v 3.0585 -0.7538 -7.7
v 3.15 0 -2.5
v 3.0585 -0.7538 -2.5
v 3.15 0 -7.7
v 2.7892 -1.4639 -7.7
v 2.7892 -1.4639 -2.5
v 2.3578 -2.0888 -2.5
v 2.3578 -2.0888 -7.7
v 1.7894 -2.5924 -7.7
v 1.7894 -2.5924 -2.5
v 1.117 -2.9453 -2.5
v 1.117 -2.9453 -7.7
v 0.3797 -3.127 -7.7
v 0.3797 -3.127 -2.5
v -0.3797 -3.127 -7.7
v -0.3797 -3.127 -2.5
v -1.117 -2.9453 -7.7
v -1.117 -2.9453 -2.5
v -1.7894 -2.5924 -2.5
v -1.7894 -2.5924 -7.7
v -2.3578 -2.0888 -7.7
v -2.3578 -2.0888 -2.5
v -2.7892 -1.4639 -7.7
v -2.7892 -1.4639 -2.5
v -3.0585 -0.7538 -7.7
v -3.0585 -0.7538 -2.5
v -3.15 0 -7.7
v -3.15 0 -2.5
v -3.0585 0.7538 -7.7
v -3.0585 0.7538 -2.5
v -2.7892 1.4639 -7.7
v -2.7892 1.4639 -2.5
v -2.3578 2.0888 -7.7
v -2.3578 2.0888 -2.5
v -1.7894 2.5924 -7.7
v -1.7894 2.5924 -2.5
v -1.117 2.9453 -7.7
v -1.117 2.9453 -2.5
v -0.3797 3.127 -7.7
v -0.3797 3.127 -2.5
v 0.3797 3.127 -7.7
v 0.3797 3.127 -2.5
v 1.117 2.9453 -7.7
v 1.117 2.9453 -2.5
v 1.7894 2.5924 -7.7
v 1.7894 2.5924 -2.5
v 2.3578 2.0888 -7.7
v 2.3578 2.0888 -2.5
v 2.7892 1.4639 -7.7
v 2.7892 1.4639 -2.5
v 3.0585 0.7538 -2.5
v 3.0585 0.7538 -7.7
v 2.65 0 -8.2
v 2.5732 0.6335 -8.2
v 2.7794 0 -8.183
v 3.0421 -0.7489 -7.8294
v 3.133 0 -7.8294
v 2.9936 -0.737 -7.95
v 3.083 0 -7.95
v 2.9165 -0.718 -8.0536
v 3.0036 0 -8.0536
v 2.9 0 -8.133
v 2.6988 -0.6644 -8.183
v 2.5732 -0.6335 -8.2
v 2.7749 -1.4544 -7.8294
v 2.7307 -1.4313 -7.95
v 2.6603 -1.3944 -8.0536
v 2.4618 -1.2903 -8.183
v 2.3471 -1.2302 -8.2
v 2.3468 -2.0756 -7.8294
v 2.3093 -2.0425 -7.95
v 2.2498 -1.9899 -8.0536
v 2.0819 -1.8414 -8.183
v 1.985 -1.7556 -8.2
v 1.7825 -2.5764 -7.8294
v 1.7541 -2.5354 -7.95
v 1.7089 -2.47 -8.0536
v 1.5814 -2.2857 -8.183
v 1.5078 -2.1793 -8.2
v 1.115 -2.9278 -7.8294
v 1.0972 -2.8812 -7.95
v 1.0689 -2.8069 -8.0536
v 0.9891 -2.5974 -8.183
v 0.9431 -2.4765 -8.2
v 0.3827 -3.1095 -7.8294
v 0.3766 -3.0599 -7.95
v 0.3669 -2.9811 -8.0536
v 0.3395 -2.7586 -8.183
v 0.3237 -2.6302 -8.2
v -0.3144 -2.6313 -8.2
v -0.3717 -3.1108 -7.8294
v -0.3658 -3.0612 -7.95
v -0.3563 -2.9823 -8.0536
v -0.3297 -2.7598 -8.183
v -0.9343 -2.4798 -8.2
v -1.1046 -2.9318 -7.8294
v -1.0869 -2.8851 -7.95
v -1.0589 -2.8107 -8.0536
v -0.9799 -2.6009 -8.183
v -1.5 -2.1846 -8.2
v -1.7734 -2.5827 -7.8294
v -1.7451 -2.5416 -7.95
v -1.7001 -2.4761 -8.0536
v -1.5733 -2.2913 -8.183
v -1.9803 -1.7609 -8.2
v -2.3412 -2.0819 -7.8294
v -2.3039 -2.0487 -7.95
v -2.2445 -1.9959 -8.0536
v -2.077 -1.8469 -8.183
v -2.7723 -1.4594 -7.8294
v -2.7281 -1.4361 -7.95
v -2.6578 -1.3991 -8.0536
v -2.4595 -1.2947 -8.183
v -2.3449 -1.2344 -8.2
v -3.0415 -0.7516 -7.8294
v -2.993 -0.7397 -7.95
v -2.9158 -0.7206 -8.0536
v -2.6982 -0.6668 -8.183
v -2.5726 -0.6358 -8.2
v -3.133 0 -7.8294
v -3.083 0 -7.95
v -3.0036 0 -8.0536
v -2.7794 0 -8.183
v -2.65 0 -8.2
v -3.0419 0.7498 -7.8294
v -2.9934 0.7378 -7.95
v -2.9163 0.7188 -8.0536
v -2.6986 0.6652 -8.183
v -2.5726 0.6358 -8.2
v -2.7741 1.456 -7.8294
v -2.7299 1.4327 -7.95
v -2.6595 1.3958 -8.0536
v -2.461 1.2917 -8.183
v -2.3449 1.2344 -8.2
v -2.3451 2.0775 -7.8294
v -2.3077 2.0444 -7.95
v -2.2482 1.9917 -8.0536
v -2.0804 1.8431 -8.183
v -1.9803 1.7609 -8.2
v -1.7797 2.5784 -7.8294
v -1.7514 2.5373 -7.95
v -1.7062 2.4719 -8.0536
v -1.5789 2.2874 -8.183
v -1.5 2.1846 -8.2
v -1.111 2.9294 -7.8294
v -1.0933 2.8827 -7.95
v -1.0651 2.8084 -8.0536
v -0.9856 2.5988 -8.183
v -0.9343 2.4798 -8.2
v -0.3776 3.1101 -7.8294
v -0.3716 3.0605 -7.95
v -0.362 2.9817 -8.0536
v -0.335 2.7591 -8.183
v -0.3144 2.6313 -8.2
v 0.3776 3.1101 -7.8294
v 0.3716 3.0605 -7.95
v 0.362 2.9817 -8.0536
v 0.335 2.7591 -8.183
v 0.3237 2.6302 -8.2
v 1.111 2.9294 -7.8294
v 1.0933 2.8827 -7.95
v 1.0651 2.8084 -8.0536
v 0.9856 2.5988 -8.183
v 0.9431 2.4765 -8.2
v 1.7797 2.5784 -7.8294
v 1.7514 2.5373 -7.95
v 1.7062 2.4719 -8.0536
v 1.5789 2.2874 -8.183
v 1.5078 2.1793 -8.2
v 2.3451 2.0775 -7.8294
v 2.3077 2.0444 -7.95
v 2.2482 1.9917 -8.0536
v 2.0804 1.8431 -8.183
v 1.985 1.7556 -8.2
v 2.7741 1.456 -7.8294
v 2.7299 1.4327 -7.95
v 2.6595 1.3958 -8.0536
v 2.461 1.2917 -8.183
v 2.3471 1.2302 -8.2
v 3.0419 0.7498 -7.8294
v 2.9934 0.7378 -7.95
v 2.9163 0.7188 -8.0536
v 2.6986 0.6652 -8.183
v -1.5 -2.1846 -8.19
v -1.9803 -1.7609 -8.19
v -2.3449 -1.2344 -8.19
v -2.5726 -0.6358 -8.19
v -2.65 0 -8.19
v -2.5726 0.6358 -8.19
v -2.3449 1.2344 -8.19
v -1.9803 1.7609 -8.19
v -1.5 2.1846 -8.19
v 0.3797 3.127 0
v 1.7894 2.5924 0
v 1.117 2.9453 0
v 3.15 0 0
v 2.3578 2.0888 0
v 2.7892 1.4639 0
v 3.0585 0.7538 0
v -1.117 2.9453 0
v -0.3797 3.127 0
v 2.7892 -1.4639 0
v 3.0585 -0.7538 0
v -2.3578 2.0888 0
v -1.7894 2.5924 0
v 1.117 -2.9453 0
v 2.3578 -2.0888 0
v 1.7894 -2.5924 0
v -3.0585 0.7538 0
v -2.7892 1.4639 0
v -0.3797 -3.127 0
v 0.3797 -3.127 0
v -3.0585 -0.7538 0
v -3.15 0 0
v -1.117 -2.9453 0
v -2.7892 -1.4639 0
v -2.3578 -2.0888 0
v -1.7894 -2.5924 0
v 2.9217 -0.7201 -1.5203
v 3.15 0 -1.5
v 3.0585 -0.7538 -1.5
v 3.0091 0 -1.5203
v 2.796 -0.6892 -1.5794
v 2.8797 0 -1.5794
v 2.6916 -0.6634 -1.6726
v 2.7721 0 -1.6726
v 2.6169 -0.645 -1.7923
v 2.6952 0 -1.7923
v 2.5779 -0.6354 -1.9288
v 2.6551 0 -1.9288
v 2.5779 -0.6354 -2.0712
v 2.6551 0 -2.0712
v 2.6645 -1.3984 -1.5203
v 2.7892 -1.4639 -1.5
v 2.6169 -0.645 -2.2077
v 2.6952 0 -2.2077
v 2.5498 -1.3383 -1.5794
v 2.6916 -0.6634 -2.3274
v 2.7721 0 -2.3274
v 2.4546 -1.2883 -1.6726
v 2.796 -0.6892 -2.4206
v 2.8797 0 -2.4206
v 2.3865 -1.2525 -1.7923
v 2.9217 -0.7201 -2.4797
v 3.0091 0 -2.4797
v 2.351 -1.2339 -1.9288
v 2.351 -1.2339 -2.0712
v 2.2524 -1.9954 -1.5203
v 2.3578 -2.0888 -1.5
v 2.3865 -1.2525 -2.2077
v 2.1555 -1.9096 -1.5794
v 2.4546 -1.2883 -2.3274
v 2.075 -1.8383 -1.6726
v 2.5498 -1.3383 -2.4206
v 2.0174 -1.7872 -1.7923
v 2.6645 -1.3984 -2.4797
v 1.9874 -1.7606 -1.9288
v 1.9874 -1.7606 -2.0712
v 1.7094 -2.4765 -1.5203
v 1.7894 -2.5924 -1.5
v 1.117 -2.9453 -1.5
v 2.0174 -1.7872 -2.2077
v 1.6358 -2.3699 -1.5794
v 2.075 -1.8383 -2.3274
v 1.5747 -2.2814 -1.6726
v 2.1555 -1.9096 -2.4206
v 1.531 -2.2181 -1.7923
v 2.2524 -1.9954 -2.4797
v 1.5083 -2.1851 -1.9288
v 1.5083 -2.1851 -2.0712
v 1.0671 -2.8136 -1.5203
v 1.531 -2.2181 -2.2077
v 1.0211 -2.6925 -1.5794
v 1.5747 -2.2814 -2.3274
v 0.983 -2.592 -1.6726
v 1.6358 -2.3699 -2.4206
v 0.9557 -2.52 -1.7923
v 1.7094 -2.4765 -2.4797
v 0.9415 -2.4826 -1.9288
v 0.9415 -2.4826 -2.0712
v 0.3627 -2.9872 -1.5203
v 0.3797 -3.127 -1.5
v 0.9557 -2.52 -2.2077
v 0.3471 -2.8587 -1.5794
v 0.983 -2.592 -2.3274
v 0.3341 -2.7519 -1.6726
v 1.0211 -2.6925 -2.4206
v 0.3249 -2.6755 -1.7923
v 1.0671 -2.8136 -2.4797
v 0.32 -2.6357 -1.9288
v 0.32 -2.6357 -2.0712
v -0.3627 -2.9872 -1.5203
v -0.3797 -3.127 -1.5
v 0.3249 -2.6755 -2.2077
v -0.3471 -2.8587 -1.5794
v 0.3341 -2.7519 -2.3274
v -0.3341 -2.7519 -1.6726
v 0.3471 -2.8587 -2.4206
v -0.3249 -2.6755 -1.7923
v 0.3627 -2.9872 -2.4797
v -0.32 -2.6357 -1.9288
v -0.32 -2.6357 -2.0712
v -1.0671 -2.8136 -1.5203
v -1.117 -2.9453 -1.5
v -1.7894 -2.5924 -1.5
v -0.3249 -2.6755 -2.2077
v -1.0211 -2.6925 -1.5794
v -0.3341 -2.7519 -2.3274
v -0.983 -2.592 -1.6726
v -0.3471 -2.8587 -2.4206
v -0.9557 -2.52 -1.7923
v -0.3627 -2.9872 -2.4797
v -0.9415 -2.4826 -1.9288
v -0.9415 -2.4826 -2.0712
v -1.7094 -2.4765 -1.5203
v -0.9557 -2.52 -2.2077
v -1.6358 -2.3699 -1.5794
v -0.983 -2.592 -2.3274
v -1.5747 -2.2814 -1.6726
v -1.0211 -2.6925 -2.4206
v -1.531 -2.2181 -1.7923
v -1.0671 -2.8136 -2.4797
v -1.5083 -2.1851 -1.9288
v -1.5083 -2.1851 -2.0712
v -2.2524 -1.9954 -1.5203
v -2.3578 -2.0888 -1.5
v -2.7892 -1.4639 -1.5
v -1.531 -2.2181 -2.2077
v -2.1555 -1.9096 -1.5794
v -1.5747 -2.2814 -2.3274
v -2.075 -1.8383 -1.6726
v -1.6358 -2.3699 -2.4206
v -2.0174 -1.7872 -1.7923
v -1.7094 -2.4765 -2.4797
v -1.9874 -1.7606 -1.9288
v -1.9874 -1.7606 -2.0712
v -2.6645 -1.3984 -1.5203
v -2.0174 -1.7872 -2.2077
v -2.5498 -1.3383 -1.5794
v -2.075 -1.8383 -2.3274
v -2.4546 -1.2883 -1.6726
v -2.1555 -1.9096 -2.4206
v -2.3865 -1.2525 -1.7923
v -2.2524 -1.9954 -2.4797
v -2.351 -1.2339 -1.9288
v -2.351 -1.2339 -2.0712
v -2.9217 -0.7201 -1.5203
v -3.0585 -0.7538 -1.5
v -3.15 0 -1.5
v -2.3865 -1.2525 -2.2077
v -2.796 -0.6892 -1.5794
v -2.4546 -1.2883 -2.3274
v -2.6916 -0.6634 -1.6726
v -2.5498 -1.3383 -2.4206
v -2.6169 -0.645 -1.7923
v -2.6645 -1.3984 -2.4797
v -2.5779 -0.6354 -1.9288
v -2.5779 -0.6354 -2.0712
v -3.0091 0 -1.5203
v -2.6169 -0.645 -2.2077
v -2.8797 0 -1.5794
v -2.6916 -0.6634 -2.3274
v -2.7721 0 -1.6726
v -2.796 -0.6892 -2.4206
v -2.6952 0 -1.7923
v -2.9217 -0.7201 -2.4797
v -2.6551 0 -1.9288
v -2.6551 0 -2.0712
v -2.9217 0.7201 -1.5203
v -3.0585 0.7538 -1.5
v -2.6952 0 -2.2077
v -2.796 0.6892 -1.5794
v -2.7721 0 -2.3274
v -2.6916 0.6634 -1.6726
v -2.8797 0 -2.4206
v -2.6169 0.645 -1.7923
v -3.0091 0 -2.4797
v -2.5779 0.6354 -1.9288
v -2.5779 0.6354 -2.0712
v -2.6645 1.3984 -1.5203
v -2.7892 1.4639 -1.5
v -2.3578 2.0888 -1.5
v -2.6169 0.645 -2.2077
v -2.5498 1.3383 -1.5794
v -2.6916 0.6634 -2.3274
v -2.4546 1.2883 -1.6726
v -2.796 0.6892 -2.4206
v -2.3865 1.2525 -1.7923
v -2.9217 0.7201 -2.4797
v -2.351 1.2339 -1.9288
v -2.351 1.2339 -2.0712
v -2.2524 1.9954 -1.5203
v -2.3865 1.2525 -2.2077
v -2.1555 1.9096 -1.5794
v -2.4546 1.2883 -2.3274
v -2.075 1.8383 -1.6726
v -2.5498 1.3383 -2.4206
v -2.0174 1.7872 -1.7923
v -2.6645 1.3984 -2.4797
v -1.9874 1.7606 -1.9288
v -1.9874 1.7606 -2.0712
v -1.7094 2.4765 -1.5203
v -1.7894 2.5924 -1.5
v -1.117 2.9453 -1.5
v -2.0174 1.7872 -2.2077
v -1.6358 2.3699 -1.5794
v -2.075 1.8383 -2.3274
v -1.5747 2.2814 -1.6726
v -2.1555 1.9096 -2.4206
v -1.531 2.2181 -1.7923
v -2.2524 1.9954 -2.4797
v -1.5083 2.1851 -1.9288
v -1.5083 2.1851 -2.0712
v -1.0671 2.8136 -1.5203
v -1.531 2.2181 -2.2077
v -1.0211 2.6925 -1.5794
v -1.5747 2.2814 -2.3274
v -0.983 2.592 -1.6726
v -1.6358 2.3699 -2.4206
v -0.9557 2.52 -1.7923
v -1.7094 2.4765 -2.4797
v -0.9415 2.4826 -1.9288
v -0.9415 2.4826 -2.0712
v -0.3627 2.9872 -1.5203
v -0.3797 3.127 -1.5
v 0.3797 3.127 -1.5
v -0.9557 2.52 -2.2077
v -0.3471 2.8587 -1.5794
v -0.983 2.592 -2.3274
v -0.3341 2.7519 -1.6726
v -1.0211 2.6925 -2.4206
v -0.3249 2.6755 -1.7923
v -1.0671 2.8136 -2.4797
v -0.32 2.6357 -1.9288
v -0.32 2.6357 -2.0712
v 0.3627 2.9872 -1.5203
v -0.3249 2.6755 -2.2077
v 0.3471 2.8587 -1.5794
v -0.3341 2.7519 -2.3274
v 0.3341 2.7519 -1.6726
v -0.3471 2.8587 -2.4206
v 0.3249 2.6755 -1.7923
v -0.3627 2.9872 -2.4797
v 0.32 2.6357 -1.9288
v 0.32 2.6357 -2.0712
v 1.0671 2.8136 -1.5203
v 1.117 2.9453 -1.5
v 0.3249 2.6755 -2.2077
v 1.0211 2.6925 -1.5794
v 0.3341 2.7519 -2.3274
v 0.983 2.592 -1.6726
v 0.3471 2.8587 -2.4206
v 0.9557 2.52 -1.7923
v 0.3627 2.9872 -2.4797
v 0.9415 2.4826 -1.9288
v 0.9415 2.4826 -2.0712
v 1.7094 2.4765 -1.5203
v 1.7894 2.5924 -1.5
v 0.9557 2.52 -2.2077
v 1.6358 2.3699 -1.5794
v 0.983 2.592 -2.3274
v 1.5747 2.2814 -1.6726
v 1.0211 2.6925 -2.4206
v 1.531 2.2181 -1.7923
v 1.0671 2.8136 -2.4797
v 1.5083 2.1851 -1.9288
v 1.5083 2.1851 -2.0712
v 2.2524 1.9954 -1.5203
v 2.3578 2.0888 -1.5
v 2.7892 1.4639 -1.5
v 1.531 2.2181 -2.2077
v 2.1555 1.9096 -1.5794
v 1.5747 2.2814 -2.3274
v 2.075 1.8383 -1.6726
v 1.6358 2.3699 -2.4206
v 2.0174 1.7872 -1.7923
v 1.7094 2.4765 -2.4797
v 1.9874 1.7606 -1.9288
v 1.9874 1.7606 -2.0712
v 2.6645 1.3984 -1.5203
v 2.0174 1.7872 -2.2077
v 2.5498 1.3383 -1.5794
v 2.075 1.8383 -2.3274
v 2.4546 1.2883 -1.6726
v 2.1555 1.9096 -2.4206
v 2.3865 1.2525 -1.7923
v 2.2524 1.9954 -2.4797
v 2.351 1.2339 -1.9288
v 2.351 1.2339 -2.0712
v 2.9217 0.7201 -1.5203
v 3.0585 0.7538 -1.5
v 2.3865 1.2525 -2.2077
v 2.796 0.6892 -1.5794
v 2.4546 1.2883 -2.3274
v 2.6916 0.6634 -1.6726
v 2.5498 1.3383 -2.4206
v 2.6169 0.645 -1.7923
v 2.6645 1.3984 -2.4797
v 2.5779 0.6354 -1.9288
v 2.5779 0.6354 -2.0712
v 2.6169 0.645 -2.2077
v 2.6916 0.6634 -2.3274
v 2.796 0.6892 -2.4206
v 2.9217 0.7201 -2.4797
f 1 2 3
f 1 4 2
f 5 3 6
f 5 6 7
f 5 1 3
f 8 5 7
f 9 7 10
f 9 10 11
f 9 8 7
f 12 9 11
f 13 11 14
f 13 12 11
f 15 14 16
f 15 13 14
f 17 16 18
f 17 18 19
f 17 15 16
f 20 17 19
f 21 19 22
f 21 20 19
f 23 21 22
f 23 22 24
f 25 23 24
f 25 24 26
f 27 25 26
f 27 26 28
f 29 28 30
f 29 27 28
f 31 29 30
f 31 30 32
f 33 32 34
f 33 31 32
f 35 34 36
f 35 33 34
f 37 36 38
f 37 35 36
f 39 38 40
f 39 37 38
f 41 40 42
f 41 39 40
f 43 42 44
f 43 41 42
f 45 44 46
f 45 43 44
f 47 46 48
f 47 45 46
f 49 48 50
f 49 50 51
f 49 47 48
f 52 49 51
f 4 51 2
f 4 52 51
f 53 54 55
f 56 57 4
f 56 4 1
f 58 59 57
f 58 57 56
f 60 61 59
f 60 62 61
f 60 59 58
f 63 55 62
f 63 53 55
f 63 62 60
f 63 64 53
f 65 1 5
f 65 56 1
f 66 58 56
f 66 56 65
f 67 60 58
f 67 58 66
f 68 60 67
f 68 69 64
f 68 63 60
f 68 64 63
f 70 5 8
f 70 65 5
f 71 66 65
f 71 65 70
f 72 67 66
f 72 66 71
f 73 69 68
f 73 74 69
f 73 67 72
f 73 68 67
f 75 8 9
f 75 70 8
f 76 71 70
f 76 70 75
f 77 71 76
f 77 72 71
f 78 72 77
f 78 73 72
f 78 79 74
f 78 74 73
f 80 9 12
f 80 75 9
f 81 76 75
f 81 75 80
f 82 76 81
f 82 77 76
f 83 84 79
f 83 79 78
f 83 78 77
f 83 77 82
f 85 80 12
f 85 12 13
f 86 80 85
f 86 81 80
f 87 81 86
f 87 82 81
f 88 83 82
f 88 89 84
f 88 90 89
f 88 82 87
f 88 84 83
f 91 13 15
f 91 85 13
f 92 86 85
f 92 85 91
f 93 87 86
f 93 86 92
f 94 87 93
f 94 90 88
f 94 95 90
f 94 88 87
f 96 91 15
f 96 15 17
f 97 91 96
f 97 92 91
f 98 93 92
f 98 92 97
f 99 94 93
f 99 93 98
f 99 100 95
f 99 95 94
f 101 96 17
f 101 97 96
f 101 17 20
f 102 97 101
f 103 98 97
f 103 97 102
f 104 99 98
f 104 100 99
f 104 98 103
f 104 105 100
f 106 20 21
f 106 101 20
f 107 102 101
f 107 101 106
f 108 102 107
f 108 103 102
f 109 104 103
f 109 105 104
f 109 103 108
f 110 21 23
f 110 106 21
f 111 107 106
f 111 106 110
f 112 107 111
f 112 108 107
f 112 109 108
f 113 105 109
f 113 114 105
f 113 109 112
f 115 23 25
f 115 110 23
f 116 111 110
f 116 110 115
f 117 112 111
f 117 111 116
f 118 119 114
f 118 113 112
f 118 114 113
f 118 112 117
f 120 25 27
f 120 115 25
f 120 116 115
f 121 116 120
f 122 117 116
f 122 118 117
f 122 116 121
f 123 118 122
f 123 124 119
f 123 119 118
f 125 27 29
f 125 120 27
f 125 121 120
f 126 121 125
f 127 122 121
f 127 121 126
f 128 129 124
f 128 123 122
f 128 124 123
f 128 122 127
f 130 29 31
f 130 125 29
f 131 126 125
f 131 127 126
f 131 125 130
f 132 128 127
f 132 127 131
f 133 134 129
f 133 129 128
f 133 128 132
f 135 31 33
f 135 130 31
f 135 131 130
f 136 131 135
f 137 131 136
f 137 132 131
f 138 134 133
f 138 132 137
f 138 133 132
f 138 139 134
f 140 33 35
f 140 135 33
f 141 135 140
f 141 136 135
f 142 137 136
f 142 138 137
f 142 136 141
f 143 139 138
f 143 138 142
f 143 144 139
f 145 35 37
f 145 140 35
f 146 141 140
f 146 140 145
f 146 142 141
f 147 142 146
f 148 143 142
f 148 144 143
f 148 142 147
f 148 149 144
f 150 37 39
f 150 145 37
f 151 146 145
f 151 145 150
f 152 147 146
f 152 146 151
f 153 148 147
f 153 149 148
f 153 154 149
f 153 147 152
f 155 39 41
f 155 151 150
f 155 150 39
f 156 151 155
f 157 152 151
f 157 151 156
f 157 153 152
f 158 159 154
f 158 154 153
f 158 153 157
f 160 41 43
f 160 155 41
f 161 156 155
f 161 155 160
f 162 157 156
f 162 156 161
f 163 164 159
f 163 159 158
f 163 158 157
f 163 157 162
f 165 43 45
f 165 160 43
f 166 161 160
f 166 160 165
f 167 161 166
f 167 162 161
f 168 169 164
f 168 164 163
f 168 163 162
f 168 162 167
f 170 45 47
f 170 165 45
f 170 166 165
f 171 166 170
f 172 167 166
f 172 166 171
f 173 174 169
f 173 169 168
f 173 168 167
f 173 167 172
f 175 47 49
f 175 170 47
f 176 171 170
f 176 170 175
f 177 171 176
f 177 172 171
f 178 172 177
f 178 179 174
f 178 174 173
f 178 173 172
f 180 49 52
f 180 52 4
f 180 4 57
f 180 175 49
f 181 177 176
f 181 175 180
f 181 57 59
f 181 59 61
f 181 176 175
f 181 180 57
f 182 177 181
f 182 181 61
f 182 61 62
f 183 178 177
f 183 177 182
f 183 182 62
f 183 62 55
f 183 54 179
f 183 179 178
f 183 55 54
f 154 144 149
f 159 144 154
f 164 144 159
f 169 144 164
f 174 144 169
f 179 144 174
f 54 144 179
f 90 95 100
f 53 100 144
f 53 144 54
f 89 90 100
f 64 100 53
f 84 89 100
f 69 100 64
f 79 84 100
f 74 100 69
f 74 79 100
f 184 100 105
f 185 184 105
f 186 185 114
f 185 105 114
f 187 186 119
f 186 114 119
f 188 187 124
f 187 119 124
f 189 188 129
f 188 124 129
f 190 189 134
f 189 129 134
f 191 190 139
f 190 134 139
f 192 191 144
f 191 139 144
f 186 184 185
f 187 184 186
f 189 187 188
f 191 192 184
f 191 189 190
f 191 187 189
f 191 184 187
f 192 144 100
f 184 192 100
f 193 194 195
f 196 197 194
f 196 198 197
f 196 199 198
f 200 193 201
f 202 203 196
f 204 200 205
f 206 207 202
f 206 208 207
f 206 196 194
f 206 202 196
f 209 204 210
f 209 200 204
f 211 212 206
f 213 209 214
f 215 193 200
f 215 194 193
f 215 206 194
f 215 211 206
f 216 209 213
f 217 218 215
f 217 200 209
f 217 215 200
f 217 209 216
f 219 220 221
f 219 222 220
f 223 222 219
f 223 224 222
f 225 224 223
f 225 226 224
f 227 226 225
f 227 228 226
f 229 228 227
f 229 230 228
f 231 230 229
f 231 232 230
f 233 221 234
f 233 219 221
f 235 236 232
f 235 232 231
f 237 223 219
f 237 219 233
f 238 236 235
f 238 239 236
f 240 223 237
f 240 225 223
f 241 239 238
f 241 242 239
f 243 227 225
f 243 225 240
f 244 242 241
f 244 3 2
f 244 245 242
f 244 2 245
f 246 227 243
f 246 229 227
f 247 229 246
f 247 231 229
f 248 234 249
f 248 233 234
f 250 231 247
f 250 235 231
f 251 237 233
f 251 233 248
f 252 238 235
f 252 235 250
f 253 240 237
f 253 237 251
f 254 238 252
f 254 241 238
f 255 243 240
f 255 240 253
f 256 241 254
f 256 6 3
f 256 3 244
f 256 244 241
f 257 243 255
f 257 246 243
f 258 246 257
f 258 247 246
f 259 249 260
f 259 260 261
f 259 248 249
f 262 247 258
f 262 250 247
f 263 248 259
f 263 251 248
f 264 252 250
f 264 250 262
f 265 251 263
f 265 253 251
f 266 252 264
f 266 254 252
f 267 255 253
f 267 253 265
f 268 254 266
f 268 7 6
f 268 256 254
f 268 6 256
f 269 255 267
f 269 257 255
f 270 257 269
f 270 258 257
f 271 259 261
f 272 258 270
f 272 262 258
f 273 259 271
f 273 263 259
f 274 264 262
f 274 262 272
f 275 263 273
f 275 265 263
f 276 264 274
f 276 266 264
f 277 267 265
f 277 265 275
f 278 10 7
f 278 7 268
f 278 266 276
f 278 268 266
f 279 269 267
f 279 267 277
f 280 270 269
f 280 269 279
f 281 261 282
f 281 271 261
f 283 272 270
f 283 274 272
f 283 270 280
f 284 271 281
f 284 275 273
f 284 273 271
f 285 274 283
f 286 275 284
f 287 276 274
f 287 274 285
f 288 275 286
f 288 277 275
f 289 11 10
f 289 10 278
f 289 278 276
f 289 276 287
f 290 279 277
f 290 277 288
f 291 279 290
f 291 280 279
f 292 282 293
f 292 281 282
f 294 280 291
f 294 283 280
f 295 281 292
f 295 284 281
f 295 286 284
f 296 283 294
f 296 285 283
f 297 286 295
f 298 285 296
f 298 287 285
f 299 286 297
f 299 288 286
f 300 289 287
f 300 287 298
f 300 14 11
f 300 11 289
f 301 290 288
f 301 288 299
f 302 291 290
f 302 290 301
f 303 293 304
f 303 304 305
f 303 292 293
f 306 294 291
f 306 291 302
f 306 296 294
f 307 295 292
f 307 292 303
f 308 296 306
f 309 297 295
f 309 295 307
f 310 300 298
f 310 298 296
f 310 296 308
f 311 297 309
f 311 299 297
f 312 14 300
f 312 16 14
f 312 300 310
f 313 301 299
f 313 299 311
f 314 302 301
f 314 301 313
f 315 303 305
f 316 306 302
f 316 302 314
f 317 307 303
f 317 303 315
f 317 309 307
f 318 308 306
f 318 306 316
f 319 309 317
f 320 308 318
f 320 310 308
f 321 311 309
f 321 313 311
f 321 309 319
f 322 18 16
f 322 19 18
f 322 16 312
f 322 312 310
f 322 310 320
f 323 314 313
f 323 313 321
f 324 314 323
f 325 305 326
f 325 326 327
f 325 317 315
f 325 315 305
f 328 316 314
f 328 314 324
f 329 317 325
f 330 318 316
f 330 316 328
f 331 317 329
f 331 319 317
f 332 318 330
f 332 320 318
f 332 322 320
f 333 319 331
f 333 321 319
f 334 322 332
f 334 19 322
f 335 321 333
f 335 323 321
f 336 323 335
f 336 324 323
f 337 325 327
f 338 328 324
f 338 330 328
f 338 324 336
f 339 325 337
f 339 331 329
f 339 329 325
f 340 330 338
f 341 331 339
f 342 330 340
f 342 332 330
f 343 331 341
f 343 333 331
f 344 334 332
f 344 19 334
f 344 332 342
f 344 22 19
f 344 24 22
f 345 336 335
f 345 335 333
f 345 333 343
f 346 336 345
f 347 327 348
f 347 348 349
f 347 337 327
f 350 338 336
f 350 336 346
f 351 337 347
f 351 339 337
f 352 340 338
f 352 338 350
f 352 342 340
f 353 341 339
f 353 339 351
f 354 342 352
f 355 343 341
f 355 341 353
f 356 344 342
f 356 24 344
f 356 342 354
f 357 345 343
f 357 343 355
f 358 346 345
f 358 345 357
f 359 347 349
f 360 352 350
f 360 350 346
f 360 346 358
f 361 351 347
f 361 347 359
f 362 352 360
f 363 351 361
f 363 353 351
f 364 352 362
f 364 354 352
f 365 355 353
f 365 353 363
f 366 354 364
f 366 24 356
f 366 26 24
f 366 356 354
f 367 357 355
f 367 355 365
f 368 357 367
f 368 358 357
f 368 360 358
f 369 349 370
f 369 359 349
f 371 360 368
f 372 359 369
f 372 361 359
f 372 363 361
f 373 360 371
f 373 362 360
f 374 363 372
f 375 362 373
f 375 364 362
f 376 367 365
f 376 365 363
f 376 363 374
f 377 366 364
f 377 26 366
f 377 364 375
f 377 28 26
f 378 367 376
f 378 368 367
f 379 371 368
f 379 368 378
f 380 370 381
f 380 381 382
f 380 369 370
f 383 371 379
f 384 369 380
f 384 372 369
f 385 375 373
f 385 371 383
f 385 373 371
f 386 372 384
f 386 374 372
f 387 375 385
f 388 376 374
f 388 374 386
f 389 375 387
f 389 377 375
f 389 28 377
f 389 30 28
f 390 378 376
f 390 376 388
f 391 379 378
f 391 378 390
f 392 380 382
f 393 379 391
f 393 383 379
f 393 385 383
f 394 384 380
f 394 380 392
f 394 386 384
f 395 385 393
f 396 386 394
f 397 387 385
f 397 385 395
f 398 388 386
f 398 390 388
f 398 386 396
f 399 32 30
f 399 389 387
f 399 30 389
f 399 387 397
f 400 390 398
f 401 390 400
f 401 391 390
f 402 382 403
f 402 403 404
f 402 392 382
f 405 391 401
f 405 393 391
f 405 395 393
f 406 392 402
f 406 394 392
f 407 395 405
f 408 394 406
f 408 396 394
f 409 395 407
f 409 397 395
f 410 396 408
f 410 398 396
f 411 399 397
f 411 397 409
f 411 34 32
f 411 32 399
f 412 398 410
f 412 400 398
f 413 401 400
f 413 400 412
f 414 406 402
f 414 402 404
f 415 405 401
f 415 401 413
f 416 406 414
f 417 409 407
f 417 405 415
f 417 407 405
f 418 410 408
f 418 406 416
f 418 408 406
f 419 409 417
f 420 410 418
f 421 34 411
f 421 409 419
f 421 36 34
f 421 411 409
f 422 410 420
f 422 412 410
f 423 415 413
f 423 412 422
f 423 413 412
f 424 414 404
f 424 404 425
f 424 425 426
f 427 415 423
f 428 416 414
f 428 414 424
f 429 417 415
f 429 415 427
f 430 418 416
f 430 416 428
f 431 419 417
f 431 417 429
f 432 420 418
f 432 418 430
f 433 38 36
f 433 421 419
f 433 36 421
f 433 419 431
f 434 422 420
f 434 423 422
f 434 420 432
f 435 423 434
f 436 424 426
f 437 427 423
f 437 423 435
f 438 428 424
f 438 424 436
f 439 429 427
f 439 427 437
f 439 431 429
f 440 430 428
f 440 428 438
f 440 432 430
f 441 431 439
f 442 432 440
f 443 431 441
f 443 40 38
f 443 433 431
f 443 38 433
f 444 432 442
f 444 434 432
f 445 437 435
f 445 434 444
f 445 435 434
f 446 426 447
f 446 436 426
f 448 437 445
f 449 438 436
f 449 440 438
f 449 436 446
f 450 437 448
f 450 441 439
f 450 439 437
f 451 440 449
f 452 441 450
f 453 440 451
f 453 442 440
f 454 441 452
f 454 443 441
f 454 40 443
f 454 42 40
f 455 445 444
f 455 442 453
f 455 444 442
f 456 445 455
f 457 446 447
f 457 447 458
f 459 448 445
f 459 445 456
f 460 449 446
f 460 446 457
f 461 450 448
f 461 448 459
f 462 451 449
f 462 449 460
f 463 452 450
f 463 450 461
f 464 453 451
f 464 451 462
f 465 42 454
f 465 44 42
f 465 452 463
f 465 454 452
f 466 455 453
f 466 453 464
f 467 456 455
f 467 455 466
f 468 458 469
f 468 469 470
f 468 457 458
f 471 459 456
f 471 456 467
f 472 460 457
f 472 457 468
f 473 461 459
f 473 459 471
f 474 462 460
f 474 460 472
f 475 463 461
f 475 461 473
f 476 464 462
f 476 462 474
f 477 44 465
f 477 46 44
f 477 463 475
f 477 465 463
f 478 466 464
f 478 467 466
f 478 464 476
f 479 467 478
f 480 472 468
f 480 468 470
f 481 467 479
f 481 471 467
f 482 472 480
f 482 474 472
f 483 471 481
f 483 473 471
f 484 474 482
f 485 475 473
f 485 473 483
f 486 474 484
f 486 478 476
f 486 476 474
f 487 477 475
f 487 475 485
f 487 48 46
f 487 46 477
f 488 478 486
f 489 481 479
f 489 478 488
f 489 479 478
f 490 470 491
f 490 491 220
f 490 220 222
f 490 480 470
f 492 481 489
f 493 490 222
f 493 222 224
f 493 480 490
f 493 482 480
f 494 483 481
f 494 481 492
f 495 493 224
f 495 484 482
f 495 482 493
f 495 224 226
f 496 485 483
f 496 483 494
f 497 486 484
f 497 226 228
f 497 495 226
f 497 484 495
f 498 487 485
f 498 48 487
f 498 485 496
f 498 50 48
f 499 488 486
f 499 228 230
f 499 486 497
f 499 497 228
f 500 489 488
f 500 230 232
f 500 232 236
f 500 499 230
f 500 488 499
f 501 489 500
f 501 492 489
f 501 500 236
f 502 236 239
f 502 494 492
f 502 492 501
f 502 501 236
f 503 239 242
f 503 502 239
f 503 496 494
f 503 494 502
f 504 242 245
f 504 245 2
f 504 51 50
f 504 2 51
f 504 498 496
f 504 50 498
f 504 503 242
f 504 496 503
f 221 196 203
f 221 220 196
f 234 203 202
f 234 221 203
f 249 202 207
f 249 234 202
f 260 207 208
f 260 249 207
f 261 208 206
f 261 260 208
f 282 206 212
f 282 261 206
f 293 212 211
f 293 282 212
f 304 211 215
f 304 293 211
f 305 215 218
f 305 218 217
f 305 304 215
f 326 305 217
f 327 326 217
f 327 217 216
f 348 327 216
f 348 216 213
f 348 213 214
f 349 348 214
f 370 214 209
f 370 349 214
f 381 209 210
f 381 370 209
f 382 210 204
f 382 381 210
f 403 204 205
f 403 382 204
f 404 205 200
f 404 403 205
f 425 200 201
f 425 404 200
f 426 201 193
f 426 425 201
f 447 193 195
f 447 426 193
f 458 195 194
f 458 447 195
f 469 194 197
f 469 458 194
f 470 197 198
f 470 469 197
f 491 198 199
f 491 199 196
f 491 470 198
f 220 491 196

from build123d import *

# Parameters (mm, degrees)
CUT_EXTRUDE1_DEPTH = 0.01


with BuildPart() as part:
    # Sketch1 → Revolve1 (revolve)
    with BuildSketch(Plane(origin=(0, 0, 0), x_dir=(1, 0, 0), z_dir=(0, 1, 0))):
        with BuildLine():
            Line((0, 0), (3.15, 0))
            Line((3.15, 0), (3.15, 1.5))
            ThreePointArc((3.15, 1.5), (2.65, 2), (3.15, 2.5))
            Line((3.15, 2.5), (3.15, 7.7))
            ThreePointArc((3.15, 7.7), (3.003553391, 8.053553391), (2.65, 8.2))
            Line((2.65, 8.2), (0, 8.2))
            Line((0, 8.2), (0, 0))
        make_face()
    revolve(axis=Axis((0, 0, 0), (0, 0, -1)))

    # Sketch2 → Cut-Extrude1 (cut)
    with BuildSketch(Plane(origin=(0, 0, -8.2), x_dir=(-1, 0, 0), z_dir=(0, 0, -1))):
        with BuildLine():
            Line((1.5, 2.184605227), (1.5, -2.184605227))
            ThreePointArc((1.5, -2.184605227), (2.65, 0), (1.5, 2.184605227))
        make_face()
    extrude(amount=-CUT_EXTRUDE1_DEPTH, mode=Mode.SUBTRACT)


solid = part.part
